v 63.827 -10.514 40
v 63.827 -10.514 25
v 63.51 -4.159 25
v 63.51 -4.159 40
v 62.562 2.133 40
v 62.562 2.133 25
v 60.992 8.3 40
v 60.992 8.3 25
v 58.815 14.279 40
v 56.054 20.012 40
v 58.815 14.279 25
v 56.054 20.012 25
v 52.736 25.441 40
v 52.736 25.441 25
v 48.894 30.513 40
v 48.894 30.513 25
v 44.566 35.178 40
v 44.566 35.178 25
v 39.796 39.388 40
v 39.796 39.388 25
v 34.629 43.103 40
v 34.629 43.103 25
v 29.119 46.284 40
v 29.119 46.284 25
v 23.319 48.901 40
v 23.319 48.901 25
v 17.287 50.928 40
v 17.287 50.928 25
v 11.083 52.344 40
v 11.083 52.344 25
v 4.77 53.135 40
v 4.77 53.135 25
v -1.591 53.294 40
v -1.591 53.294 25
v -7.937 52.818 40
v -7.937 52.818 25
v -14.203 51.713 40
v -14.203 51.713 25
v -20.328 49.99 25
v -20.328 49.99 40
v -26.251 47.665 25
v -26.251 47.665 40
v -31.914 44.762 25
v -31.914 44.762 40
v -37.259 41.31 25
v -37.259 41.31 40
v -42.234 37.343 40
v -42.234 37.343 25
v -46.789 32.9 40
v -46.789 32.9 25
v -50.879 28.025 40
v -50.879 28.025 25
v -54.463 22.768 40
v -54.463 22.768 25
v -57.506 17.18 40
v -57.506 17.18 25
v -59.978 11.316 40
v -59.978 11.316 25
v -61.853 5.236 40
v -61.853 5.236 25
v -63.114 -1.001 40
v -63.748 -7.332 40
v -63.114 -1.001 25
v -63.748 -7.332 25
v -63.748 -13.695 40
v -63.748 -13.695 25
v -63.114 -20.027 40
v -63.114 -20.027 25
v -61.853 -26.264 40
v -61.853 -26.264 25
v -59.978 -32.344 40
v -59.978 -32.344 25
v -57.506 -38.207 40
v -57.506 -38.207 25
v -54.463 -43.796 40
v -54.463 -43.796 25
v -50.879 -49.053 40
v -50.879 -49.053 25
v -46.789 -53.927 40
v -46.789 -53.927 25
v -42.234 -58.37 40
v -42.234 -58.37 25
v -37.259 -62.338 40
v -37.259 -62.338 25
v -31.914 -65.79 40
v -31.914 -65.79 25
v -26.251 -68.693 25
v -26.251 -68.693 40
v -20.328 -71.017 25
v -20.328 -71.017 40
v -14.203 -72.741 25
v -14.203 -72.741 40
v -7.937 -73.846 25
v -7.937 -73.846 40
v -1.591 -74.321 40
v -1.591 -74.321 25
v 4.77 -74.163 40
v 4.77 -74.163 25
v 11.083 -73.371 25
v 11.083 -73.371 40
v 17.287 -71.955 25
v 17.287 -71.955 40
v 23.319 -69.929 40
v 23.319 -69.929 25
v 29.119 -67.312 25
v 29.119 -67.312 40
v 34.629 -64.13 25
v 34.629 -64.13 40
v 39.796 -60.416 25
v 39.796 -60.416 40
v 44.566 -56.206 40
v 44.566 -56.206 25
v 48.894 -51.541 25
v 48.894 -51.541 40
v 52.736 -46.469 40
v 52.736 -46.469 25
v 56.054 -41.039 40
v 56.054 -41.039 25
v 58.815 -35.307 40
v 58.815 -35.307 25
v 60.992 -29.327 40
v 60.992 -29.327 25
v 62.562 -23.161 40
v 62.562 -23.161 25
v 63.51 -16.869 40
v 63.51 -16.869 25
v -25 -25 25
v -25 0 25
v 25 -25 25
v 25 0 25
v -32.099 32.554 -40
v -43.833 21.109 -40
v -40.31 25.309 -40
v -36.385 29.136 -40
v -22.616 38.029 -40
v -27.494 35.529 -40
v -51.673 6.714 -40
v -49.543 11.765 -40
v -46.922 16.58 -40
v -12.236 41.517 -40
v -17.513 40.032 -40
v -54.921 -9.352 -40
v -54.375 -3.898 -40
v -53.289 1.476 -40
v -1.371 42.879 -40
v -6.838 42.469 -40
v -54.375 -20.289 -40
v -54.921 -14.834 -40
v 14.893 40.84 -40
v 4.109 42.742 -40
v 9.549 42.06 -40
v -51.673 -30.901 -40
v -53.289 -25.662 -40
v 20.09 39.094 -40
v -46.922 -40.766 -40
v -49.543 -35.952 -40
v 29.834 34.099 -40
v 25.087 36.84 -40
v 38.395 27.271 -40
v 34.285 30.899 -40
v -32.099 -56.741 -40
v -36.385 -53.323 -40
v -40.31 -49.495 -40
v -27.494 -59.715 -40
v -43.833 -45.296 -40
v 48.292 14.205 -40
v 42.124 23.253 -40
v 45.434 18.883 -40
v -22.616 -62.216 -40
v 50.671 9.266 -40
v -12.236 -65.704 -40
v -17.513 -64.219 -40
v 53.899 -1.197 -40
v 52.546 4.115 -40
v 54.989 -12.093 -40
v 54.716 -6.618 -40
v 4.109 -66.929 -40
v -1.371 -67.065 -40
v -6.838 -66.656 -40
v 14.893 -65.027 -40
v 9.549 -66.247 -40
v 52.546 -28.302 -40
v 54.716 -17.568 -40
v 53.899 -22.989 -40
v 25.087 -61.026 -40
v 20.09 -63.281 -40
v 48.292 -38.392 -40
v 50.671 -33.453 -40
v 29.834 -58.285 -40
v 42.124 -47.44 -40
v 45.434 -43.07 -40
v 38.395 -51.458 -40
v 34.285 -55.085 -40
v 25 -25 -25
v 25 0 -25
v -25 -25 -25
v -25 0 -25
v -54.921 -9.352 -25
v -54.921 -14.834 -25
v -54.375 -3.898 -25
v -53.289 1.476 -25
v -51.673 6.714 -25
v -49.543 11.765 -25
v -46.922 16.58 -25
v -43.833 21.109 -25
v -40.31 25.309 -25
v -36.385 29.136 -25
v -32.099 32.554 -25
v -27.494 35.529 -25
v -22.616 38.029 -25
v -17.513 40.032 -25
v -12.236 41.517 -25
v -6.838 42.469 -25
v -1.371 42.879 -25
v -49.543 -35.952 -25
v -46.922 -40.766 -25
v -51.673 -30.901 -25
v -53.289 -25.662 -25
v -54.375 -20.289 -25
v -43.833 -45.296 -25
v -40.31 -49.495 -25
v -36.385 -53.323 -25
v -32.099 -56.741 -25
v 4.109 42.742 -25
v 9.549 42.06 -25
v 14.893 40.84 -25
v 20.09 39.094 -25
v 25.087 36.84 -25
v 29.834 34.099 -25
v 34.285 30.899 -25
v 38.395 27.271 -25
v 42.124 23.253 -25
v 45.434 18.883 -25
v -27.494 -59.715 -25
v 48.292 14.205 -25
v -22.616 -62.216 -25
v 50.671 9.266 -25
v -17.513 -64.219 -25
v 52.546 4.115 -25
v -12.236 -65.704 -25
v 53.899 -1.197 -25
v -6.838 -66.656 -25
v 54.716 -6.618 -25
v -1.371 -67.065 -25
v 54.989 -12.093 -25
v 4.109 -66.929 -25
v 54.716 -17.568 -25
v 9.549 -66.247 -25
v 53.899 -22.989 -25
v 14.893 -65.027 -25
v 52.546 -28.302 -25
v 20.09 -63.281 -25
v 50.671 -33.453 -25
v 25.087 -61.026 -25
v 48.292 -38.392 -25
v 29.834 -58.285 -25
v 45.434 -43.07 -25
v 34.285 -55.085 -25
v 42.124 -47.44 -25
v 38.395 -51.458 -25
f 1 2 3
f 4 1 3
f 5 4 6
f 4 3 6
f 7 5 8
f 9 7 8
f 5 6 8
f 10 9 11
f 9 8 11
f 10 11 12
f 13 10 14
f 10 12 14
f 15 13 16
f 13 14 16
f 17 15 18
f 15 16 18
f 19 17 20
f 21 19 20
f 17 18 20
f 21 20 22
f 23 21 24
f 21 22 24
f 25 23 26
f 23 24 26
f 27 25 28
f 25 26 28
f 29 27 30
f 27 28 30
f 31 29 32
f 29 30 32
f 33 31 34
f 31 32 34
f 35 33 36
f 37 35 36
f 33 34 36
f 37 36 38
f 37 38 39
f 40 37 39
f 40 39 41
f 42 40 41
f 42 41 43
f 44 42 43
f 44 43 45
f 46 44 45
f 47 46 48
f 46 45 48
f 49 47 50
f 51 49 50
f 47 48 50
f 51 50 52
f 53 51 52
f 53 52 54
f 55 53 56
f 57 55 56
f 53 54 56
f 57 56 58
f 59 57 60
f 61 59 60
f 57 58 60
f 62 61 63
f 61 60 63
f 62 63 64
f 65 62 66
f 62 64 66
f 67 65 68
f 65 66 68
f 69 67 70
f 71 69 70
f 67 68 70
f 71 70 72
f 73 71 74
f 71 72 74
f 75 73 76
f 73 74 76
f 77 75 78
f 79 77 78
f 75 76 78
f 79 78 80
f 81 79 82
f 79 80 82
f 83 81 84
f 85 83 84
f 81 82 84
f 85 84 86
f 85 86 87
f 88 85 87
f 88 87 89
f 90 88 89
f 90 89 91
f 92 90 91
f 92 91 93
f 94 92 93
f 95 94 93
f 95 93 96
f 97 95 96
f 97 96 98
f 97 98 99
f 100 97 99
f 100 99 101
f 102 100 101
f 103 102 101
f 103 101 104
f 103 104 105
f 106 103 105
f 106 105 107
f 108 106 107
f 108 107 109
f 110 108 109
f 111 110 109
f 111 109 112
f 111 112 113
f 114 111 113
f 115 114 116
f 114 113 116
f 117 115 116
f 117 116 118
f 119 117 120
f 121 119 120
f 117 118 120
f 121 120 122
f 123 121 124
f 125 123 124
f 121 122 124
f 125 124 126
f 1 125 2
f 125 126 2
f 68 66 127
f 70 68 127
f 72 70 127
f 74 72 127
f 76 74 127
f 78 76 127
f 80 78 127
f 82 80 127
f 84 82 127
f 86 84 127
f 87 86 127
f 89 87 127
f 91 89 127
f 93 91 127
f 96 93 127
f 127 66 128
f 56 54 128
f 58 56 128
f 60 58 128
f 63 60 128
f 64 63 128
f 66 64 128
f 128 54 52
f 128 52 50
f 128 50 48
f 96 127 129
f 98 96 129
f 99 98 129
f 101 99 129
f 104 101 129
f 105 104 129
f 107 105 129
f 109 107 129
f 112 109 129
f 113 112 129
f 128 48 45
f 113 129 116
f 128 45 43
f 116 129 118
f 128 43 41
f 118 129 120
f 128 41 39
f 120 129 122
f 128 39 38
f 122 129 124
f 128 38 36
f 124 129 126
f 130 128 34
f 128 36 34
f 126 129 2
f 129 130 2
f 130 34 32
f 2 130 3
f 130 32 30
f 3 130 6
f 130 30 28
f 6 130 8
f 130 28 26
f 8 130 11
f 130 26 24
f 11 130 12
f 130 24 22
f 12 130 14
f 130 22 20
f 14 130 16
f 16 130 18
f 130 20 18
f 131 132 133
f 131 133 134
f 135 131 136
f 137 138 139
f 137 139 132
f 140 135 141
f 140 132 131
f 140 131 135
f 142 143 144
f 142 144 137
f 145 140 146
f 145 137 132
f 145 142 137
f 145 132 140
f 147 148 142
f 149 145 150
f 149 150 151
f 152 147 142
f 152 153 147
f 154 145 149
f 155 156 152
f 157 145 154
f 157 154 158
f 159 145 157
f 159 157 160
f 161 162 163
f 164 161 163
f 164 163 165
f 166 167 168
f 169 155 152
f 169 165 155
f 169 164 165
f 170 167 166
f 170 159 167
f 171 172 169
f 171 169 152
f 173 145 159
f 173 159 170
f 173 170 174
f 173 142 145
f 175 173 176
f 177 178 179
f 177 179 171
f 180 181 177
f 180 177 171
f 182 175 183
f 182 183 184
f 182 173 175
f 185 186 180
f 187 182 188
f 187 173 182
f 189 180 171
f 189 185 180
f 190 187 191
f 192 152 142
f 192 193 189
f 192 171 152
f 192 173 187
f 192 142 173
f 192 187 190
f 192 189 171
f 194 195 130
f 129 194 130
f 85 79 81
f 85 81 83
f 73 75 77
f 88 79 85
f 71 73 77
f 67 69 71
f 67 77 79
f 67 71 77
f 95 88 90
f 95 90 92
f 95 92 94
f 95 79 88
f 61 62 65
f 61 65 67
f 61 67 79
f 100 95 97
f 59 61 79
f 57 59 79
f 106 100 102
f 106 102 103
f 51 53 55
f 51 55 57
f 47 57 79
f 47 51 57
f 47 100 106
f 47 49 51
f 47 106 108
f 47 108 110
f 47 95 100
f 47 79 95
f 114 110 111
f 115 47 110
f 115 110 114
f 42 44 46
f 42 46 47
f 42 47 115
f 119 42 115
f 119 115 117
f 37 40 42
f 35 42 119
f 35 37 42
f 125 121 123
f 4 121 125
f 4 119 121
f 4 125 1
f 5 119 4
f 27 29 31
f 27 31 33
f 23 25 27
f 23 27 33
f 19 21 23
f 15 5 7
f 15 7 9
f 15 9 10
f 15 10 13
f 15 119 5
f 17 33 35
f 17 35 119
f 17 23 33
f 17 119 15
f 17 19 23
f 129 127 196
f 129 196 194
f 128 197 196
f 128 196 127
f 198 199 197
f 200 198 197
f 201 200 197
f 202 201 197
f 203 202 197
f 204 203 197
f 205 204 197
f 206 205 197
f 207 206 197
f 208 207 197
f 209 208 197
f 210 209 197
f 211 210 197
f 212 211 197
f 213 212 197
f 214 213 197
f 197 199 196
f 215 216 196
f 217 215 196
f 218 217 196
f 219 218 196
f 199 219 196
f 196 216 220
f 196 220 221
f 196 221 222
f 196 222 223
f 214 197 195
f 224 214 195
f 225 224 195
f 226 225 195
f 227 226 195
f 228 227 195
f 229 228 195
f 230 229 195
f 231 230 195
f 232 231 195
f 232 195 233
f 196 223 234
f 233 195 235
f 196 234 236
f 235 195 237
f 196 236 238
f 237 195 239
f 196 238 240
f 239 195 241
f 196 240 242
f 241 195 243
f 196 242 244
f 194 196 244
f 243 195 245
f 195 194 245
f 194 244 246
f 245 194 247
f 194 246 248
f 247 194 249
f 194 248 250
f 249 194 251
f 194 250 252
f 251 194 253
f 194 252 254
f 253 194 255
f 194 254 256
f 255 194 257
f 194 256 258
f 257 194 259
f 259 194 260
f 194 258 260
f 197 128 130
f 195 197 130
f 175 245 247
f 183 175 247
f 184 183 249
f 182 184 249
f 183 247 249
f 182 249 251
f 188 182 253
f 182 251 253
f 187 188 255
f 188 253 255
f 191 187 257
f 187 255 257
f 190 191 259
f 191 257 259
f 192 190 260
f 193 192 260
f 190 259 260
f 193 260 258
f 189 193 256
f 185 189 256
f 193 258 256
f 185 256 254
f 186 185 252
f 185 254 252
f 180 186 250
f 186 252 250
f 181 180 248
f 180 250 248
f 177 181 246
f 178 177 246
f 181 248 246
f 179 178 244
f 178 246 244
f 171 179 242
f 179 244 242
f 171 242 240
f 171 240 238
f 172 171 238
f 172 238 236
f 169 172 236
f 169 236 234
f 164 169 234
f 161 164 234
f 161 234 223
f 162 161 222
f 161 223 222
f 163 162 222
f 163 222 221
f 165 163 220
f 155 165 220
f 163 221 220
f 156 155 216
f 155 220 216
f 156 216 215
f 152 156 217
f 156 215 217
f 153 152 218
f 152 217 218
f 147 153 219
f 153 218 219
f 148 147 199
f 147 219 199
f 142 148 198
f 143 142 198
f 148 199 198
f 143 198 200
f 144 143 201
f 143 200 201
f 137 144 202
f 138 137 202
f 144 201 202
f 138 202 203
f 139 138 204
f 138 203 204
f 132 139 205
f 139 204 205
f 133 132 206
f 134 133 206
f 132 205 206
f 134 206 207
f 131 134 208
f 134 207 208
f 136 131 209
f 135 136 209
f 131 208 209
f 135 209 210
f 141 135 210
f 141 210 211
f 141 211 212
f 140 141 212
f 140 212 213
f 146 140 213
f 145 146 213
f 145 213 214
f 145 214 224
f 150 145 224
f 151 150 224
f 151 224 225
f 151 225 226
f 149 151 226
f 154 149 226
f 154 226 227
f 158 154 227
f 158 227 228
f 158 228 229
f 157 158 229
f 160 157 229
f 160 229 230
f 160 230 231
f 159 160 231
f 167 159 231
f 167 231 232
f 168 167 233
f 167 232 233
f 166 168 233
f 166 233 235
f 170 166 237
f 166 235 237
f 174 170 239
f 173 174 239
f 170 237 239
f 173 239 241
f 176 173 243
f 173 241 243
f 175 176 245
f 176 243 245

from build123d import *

# Parameters (mm, degrees)
F0_W      = 50
F0_H      = 50
F1_DEPTH  = 25
F2_R      = 63.827171
F3_DEPTH  = 15
F1_FACE_W = 50
F1_FACE_H = 25
F4_R      = 54.988955
F4_W      = 50
F4_H      = 25
F5_DEPTH  = 15


with BuildPart() as f1:
    # F0 (on Front) → F1 (new body)
    with BuildSketch(Plane.XZ):
        Rectangle(F0_W, F0_H)
    extrude(amount=F1_DEPTH)

    # F2 (on face) → F3 (join)
    with BuildSketch(Plane.XY.offset(25)):
        with Locations((0, -10.513827)):
            Circle(F2_R)
    extrude(amount=F3_DEPTH)

    # F1_face (on face) + F4 (on face) → F5 (join)
    with BuildSketch(Plane(origin=(0, -12.5, 25), x_dir=(1, 0, 0), z_dir=(0, 0, 1))):
        Rectangle(F1_FACE_W, F1_FACE_H)
    with BuildSketch(Plane(origin=(0, 0, -25), x_dir=(1, 0, 0), z_dir=(0, 0, -1))):
        with Locations((0, 12.09332)):
            Circle(F4_R)
        with Locations((0, 12.5)):
            Rectangle(F4_W, F4_H, mode=Mode.SUBTRACT)
        with Locations((0, 12.5)):
            Rectangle(F4_W, F4_H)
    extrude(amount=F5_DEPTH)


solid = f1.part
